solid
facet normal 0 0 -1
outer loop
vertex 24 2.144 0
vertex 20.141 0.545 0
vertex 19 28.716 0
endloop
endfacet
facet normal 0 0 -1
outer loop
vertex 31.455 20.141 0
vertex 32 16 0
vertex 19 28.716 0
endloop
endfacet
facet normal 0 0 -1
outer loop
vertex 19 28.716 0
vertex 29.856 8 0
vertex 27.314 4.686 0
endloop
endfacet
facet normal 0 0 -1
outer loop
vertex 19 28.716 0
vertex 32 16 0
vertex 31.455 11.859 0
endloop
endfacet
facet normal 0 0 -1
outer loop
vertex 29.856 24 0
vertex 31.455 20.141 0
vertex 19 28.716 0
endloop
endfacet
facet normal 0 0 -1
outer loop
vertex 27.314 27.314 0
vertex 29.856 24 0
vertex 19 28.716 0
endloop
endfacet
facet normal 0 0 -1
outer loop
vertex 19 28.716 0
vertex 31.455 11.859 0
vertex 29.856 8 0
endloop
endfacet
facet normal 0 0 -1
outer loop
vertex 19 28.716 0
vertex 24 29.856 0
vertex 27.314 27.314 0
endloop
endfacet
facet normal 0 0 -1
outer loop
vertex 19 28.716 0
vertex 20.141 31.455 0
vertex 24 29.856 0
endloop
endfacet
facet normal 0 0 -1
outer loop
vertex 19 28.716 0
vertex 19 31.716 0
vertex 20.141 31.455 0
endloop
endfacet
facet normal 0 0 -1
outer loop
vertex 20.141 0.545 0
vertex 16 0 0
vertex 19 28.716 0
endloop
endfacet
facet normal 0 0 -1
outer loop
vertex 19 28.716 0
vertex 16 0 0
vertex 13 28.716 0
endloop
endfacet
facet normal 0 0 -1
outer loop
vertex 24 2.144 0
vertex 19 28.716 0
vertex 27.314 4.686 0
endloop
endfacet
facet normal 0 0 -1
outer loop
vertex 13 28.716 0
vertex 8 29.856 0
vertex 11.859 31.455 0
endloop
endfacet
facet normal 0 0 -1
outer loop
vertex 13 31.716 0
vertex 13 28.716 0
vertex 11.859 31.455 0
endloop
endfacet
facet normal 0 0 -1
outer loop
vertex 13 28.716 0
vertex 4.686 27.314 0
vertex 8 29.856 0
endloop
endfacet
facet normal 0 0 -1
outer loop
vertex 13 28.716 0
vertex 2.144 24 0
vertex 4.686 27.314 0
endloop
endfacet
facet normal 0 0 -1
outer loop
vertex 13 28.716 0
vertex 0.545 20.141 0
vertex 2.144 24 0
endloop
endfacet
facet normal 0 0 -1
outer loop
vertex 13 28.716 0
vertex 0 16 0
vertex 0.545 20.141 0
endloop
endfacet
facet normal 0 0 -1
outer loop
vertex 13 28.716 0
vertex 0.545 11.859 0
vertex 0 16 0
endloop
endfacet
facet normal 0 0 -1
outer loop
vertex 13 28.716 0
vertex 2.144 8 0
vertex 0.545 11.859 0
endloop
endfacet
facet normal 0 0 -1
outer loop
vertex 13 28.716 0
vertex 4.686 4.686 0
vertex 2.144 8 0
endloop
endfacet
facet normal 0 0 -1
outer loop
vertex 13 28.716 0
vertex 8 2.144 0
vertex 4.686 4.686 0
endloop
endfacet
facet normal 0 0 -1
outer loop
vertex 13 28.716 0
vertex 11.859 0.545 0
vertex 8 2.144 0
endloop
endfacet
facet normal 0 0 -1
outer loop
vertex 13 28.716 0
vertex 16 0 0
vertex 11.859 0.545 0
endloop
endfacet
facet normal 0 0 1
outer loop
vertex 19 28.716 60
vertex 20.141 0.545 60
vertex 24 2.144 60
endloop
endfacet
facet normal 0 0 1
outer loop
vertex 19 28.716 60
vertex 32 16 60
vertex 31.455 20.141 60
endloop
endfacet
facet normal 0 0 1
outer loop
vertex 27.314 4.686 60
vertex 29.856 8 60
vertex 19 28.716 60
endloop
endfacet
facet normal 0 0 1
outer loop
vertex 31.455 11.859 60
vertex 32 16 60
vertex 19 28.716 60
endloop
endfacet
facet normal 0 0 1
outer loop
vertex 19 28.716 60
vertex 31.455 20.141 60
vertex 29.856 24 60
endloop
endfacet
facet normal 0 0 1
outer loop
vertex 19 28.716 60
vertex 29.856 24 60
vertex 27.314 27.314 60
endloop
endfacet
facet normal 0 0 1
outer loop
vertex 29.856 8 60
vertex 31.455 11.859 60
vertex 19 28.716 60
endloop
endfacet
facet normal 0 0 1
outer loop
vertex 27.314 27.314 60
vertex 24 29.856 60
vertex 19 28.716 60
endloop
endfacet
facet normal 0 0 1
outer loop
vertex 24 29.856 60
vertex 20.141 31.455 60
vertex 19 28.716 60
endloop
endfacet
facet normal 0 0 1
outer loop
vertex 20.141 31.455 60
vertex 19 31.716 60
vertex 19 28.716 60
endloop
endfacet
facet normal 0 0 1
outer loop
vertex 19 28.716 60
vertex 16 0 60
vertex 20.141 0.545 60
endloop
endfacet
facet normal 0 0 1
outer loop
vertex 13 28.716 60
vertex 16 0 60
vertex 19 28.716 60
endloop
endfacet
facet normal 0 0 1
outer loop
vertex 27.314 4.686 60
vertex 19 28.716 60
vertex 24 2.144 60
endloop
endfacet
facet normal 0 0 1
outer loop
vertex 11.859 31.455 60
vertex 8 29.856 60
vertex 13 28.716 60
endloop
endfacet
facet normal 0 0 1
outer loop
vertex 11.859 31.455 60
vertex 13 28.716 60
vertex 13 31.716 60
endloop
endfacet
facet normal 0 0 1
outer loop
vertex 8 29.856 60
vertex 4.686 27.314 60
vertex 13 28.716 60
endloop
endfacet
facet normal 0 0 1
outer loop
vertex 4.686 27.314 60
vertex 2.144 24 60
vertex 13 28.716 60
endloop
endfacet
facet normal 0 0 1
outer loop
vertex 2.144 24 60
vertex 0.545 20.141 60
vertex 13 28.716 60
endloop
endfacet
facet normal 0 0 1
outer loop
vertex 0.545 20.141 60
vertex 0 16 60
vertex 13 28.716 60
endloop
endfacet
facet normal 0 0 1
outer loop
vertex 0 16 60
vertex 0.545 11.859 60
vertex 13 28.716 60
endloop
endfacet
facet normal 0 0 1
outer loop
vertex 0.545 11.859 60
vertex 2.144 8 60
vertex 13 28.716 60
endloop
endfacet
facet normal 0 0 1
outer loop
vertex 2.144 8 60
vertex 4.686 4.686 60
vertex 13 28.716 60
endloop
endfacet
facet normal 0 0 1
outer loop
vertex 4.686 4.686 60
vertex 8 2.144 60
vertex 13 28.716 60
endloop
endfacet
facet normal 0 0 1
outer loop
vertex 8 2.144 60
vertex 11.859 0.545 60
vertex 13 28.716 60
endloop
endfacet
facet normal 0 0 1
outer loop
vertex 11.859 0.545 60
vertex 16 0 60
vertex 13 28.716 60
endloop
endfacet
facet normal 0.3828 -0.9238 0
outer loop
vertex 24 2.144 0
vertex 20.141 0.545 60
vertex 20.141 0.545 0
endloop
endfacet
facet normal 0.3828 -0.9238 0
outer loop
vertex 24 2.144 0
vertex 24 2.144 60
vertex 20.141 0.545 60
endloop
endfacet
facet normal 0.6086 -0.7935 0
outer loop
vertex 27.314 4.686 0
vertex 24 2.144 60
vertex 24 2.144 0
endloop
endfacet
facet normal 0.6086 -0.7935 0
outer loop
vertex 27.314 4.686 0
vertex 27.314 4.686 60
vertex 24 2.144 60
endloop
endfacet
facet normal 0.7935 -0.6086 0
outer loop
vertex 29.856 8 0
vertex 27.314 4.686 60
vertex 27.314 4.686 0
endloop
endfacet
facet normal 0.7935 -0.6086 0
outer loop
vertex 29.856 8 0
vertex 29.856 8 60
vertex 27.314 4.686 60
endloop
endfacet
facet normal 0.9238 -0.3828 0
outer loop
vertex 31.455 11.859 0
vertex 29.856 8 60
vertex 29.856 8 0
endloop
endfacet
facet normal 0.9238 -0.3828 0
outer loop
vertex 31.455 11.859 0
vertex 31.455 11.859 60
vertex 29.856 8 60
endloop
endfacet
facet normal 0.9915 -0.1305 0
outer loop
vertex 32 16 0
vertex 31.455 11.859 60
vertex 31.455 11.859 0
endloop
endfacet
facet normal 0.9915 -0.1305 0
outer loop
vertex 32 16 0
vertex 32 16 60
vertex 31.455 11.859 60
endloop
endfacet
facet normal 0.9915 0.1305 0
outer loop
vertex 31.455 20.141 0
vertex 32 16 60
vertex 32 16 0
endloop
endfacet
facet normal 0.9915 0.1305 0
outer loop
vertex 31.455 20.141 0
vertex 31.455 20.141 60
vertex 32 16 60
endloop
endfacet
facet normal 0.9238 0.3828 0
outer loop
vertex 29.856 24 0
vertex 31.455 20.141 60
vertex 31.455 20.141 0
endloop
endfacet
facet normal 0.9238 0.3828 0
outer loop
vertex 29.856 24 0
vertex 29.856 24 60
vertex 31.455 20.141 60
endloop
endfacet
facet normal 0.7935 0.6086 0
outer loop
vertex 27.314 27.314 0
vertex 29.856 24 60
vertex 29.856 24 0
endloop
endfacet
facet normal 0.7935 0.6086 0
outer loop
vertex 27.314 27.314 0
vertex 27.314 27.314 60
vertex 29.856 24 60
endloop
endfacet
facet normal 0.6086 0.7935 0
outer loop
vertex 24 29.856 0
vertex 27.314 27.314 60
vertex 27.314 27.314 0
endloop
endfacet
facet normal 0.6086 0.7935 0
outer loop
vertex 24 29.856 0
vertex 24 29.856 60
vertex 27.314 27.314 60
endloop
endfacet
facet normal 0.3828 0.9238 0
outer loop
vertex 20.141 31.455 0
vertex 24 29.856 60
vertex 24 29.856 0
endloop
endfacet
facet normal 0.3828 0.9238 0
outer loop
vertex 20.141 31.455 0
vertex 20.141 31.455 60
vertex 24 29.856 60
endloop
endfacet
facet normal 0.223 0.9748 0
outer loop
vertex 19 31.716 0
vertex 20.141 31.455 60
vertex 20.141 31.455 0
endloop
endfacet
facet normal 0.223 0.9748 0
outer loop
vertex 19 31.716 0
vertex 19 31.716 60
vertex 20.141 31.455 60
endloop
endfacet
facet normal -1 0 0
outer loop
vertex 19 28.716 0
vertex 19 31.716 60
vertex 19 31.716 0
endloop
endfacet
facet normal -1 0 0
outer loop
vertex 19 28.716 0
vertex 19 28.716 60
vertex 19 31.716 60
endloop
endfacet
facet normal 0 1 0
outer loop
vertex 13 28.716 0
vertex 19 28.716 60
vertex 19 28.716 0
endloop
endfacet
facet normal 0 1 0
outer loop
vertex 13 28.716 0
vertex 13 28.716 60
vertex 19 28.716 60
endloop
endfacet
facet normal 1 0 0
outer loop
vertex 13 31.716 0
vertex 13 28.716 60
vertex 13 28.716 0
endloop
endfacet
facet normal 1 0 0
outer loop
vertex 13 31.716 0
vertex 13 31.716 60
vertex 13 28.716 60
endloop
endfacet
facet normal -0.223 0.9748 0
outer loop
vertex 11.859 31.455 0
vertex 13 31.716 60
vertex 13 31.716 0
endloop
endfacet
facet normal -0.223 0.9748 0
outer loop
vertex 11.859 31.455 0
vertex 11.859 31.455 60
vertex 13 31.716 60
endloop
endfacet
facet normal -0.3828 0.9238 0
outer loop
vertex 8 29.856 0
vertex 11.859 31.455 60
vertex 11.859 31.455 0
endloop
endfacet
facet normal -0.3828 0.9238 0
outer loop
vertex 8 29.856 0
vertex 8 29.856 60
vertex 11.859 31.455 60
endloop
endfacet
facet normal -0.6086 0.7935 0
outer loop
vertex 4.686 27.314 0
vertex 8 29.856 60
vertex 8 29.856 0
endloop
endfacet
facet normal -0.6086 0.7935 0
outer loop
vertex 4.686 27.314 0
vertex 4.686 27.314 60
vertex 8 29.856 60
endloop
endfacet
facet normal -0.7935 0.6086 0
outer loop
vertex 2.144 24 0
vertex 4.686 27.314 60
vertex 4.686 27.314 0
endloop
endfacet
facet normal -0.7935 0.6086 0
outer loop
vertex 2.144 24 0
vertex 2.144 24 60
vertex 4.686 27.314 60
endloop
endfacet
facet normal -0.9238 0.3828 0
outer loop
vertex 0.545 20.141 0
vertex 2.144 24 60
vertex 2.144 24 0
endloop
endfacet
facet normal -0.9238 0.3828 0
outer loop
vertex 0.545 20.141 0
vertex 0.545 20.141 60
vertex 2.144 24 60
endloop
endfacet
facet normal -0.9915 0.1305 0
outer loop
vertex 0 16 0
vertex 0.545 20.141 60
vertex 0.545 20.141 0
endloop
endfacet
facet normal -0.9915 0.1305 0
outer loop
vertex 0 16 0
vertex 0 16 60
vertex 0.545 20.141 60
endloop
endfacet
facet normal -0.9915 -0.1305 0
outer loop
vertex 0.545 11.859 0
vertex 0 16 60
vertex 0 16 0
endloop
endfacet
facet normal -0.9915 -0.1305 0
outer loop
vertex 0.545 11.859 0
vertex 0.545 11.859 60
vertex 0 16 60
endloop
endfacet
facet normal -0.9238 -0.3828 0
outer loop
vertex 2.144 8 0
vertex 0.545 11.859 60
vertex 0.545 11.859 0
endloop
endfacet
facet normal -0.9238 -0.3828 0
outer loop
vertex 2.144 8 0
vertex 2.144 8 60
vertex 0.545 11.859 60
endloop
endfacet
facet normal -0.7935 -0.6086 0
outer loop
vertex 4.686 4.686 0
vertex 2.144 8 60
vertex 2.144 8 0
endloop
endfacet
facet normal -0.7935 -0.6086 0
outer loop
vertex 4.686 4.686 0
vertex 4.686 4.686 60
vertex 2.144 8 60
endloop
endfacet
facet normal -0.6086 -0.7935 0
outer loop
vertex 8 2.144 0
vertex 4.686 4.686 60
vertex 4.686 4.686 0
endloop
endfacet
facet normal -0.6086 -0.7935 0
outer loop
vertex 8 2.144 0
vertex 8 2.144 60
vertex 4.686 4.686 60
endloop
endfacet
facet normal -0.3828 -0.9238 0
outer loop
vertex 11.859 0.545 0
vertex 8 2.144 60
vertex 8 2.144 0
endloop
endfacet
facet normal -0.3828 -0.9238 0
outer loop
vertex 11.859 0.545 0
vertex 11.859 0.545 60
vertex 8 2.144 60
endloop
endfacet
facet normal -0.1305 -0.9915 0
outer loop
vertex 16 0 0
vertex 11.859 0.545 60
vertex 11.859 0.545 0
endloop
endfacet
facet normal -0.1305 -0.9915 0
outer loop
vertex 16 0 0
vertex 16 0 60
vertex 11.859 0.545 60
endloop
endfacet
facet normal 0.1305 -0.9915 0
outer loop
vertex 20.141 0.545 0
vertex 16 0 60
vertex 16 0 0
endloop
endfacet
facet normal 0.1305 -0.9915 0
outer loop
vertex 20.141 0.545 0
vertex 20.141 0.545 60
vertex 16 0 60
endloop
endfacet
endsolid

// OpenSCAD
$fn = 32;

// ----------------------------------------------------------------------
// Keyway shaft: d32 shaft, key 6 x 3 mm
// ----------------------------------------------------------------------

// --- parameters (mm) ---
shaft_r = 16;             // shaft radius
key_w = 6;                // keyway width
key_d = 3;                // keyway depth below the surface line
plate_t = 60;             // shaft length, Z (extrusion height)

shaft_d = 2 * shaft_r;  // shaft diameter
circle_step = 15;  // polygon sampling step, degrees

profile = [[11.859, 31.455], [8, 29.856], [4.686, 27.314], [2.144, 24], [0.545, 20.141], [0, 16], [0.545, 11.859], [2.144, 8], [4.686, 4.686], [8, 2.144], [11.859, 0.545], [16, 0], [20.141, 0.545], [24, 2.144], [27.314, 4.686], [29.856, 8], [31.455, 11.859], [32, 16], [31.455, 20.141], [29.856, 24], [27.314, 27.314], [24, 29.856], [20.141, 31.455], [19, 31.716], [19, 28.716], [13, 28.716], [13, 31.716]];  // primary outline, 27 points, counter clockwise

// --- the one profile operation ---
linear_extrude(height = plate_t) polygon(points = profile);
